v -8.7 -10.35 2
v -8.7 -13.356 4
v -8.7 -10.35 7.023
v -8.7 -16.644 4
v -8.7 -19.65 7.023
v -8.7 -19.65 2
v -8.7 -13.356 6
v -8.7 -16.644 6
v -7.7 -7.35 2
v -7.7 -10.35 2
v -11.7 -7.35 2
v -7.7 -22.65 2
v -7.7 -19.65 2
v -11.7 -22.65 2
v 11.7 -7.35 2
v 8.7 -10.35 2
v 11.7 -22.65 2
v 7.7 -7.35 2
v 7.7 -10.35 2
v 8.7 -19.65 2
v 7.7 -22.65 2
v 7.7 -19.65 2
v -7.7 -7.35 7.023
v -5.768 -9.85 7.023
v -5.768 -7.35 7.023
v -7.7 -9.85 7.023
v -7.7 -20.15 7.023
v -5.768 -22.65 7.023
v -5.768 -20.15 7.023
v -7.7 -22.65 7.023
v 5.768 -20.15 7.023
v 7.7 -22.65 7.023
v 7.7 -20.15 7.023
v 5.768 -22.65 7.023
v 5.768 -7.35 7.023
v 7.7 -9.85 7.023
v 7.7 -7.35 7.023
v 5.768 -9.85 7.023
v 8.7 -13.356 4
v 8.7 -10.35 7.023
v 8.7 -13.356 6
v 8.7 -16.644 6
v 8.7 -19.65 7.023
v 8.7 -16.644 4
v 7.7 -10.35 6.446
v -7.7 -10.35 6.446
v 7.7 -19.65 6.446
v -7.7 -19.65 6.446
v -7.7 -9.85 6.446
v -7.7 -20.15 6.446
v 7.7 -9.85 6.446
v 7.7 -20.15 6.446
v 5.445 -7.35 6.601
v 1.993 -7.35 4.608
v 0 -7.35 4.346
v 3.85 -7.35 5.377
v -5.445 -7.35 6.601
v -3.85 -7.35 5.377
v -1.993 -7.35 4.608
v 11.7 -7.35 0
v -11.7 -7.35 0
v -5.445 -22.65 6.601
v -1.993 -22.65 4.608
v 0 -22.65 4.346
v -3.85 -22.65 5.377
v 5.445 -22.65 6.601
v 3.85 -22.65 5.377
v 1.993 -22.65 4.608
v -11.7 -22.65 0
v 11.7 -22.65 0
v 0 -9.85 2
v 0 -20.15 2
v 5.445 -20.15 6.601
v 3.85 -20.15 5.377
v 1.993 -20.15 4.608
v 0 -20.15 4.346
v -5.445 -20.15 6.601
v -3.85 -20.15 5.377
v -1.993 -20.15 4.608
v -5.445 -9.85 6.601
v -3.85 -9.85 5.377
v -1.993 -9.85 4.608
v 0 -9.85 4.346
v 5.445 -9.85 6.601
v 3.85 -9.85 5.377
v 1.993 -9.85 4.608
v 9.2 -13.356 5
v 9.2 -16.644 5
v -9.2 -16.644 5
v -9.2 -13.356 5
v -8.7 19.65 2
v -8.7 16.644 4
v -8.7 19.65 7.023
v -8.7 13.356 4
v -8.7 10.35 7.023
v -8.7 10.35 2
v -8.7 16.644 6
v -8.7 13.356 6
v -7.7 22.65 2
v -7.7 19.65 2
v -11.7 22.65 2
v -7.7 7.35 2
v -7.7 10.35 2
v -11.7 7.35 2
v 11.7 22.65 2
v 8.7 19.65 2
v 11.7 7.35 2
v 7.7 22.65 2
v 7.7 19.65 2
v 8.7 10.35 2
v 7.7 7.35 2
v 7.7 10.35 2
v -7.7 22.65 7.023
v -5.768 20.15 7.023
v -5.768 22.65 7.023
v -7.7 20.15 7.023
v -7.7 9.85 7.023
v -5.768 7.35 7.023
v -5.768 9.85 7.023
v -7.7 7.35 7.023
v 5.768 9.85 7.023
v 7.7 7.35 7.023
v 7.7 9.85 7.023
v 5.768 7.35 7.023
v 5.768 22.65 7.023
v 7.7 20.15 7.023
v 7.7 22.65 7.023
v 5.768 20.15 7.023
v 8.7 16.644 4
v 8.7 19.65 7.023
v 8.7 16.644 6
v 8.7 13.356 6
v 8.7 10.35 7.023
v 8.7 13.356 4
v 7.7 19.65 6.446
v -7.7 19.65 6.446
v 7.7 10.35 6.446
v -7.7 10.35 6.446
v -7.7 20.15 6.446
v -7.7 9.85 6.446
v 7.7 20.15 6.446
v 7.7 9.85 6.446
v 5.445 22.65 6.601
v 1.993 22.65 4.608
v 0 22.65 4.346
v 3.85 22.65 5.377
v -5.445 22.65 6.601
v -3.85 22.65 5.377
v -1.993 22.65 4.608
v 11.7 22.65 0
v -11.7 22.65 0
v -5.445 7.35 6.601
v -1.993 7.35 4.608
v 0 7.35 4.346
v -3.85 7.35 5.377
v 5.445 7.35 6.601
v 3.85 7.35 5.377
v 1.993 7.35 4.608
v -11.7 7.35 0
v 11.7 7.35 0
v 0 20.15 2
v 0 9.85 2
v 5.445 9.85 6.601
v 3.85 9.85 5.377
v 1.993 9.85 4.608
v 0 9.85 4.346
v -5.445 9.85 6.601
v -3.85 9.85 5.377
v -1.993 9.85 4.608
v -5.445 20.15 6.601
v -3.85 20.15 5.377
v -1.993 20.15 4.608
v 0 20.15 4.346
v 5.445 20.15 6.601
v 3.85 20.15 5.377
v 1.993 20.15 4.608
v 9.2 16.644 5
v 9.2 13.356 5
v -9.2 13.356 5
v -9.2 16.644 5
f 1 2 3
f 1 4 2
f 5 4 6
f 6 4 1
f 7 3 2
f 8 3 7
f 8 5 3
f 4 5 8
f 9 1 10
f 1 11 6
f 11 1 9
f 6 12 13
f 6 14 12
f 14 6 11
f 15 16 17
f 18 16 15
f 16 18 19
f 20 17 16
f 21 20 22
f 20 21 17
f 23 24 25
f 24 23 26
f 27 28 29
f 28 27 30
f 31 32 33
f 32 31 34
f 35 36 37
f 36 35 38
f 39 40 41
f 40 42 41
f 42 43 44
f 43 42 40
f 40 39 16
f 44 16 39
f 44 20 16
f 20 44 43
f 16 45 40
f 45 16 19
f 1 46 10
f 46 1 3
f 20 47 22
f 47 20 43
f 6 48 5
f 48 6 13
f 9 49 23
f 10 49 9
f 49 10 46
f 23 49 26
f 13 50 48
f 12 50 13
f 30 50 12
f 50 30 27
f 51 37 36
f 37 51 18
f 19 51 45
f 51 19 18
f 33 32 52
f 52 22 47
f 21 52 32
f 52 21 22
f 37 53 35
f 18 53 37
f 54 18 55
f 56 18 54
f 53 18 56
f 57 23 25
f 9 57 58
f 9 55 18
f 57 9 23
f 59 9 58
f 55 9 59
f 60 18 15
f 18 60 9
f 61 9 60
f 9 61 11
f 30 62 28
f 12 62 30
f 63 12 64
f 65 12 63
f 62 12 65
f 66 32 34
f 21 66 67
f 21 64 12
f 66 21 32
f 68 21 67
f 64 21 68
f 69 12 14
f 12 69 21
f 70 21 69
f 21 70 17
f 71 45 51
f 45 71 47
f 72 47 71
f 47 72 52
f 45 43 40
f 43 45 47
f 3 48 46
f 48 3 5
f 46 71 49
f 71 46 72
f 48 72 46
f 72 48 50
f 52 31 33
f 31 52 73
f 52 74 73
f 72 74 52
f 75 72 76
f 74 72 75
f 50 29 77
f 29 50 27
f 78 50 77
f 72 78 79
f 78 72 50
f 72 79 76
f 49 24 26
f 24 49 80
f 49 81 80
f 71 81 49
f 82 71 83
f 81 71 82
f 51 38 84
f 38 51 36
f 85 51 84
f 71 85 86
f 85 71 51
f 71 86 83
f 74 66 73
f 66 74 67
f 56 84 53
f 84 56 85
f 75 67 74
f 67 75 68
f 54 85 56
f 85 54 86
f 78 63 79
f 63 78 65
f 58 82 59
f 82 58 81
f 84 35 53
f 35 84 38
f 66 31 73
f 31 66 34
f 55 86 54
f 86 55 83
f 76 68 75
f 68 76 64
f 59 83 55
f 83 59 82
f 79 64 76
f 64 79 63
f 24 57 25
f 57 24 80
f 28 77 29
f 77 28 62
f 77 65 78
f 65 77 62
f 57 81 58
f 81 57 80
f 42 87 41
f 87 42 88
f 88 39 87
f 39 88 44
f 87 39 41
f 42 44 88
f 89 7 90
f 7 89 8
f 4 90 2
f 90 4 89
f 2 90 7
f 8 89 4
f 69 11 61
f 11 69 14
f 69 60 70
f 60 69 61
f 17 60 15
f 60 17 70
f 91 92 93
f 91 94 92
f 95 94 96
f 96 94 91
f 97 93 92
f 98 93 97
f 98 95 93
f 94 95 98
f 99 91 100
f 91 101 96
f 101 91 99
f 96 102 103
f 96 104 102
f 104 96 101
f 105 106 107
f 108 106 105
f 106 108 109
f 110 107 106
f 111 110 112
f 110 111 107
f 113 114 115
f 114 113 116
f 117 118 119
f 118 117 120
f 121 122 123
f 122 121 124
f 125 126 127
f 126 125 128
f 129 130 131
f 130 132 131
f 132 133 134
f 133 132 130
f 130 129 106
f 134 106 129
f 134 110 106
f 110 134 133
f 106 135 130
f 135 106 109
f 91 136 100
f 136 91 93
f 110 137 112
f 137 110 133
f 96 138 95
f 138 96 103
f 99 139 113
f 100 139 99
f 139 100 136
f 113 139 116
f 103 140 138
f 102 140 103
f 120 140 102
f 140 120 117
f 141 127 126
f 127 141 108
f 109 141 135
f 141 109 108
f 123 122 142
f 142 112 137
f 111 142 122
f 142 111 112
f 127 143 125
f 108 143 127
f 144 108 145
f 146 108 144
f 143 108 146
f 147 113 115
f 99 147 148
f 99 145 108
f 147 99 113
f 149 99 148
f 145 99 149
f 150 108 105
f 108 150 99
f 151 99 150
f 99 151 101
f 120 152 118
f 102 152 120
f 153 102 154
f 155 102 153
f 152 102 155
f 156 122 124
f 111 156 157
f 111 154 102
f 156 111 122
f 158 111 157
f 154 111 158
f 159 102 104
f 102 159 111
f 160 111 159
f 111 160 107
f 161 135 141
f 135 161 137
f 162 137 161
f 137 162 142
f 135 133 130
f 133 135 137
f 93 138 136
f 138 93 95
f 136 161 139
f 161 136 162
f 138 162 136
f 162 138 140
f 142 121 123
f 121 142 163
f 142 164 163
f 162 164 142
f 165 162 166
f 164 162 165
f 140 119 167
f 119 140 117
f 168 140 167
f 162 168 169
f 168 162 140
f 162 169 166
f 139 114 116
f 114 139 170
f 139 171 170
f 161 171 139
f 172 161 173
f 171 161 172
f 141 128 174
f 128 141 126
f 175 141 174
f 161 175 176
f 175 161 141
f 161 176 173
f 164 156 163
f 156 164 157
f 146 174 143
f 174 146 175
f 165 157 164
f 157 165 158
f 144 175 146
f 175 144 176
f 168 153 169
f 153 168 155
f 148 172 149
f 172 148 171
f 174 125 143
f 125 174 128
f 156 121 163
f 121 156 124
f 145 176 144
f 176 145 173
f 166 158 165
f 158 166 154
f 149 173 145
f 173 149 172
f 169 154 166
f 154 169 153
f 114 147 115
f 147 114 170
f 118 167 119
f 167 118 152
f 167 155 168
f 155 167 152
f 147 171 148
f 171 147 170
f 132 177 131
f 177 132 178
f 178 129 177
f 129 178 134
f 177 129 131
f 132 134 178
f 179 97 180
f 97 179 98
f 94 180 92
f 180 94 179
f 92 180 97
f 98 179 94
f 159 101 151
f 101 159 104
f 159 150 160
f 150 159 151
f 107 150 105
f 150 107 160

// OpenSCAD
// file: nut_capture.scad
use <GDMUtils.scad>

module nut_capture(nut_size=17.4, nut_thick=9.5, offset=18, slop=0.25, wall=3)
{
	nut_rad = nut_size/cos(30)/2;
	base = (offset - nut_rad);
	h = nut_rad*2 + base;
	w = nut_thick + wall*2;
	l = nut_size + wall*2;

	difference() {
		// Outer shell.
		translate([0, 0, h/2])
			cube(size=[l, w, h], center=true);

		translate([0, 0, base+nut_rad]) {
			// Nut slot.
			hull() {
				grid_of(za=[0, h]) {
					zrot(90) yrot(90) {
						cylinder(h=nut_thick+slop*2, r=nut_rad+slop, center=true, $fn=6);
					}
				}
			}
		
			// Rod access.
			hull() {
				grid_of(za=[0, h]) {
					zrot(90) yrot(90) {
						cylinder(h=w+1, r=nut_size/2-1, center=true, $fn=24);
					}
				}
			}
		}

		// Snap hole.
		translate([0, 0, h-3])
			cube(size=[l+1, nut_thick/2, 1.5], center=true);
	}
}
//!nut_capture(nut_size=17.4, nut_thick=9.5);



module nut_capture_cap(nut_size=17.4, nut_thick=9.5, wall=3, cap_thick=2)
{
	nut_rad = nut_size/cos(30)/2;
	h = nut_rad/2;
	l = nut_size + wall*2;
	w = nut_thick + wall*2;

	color("DeepSkyBlue") union() {
		// cap
		translate([0, 0, cap_thick/2])
			cube(size=[l, w, cap_thick], center=true);

		difference() {
			// Plug
			union() {
				translate([0, 0, -h/2])
					cube(size=[nut_size, nut_thick, h], center=true);
				translate([0, 0, -h/2])
					cube(size=[nut_size-2, w, h], center=true);
			}

			// Remove nut area.
			translate([0, 0, -nut_rad]) {
				zrot(90) yrot(90) {
					cylinder(h=nut_thick+1, r=nut_rad, center=true, $fn=6);
				}
			}

			// Remove Rod access.
			translate([0, 0, -nut_rad]) {
				zrot(90) yrot(90) {
					cylinder(h=w+1, r=nut_size/2-1, center=true, $fn=24);
				}
			}
		}

		// Snap ridges
		grid_of(
			xa=[-nut_size/2, nut_size/2],
			za=[-3]
		) {
			scale([1.0, nut_thick/2, 2.0])
				yrot(45) cube(size=1/sqrt(2), center=true);
		}
	}
}
!nut_capture_cap(nut_size=17.4, nut_thick=9.5);



// vim: noexpandtab tabstop=4 shiftwidth=4 softtabstop=4 nowrap
// file: config.scad
snappy_version = 0.90;


platform_length = 110; // mm.  Must be a multiple of rack_tooth_size.
platform_width  = 150; // mm
platform_height =  40; // mm
platform_thick  =   7; // mm
rack_tooth_size =   5; // mm per tooth.

rail_length  = 150;    // mm
rail_height  =  50;    // mm
rail_thick   =   7;    // mm

motor_rail_length = 100; // mm

roller_thick =  12;    // mm
roller_diam  =  30;    // mm
roller_axle  =  15;    // mm
roller_base  =  12;    // mm
roller_angle =  30;    // degrees

joiner_angle =  30;    // degrees
joiner_width =  10;    // mm
joiner_slop  =   0.5;  // mm

// Currently configured for 3/8" ACME threaded rod and matching 11/16" nut
lifter_rod_diam   =   9.5; // mm
lifter_rod_length = 300.0; // mm
lifter_nut_size   =  17.4; // mm
lifter_nut_thick  =   9.3; // mm
lifter_thread_size =  3.175; // mm lift per revolution




// Commonly used derived values.  Don't change these.
rail_spacing = platform_width - joiner_width*4 - 10;
roller_spacing = rail_spacing-roller_diam+0.5;
rail_width = rail_spacing + joiner_width*2;



// vim: noexpandtab tabstop=4 shiftwidth=4 softtabstop=4 nowrap
// main file
include <config.scad>
use <GDMUtils.scad>
use <nut_capture.scad>



module z_nut_cap()
{
	color("DeepSkyBlue") {
		nut_capture_cap(
			nut_size=lifter_nut_size,
			nut_thick=lifter_nut_thick,
			wall=3,
			cap_thick=2
		);
	}
}



module z_nut_cap_part() { // make me
	grid_of(ya=[-15, 15]) {
		translate([0, 0, 2])
			yrot(180) z_nut_cap();
	}
}



z_nut_cap_part();



// vim: noexpandtab tabstop=4 shiftwidth=4 softtabstop=4 nowrap
